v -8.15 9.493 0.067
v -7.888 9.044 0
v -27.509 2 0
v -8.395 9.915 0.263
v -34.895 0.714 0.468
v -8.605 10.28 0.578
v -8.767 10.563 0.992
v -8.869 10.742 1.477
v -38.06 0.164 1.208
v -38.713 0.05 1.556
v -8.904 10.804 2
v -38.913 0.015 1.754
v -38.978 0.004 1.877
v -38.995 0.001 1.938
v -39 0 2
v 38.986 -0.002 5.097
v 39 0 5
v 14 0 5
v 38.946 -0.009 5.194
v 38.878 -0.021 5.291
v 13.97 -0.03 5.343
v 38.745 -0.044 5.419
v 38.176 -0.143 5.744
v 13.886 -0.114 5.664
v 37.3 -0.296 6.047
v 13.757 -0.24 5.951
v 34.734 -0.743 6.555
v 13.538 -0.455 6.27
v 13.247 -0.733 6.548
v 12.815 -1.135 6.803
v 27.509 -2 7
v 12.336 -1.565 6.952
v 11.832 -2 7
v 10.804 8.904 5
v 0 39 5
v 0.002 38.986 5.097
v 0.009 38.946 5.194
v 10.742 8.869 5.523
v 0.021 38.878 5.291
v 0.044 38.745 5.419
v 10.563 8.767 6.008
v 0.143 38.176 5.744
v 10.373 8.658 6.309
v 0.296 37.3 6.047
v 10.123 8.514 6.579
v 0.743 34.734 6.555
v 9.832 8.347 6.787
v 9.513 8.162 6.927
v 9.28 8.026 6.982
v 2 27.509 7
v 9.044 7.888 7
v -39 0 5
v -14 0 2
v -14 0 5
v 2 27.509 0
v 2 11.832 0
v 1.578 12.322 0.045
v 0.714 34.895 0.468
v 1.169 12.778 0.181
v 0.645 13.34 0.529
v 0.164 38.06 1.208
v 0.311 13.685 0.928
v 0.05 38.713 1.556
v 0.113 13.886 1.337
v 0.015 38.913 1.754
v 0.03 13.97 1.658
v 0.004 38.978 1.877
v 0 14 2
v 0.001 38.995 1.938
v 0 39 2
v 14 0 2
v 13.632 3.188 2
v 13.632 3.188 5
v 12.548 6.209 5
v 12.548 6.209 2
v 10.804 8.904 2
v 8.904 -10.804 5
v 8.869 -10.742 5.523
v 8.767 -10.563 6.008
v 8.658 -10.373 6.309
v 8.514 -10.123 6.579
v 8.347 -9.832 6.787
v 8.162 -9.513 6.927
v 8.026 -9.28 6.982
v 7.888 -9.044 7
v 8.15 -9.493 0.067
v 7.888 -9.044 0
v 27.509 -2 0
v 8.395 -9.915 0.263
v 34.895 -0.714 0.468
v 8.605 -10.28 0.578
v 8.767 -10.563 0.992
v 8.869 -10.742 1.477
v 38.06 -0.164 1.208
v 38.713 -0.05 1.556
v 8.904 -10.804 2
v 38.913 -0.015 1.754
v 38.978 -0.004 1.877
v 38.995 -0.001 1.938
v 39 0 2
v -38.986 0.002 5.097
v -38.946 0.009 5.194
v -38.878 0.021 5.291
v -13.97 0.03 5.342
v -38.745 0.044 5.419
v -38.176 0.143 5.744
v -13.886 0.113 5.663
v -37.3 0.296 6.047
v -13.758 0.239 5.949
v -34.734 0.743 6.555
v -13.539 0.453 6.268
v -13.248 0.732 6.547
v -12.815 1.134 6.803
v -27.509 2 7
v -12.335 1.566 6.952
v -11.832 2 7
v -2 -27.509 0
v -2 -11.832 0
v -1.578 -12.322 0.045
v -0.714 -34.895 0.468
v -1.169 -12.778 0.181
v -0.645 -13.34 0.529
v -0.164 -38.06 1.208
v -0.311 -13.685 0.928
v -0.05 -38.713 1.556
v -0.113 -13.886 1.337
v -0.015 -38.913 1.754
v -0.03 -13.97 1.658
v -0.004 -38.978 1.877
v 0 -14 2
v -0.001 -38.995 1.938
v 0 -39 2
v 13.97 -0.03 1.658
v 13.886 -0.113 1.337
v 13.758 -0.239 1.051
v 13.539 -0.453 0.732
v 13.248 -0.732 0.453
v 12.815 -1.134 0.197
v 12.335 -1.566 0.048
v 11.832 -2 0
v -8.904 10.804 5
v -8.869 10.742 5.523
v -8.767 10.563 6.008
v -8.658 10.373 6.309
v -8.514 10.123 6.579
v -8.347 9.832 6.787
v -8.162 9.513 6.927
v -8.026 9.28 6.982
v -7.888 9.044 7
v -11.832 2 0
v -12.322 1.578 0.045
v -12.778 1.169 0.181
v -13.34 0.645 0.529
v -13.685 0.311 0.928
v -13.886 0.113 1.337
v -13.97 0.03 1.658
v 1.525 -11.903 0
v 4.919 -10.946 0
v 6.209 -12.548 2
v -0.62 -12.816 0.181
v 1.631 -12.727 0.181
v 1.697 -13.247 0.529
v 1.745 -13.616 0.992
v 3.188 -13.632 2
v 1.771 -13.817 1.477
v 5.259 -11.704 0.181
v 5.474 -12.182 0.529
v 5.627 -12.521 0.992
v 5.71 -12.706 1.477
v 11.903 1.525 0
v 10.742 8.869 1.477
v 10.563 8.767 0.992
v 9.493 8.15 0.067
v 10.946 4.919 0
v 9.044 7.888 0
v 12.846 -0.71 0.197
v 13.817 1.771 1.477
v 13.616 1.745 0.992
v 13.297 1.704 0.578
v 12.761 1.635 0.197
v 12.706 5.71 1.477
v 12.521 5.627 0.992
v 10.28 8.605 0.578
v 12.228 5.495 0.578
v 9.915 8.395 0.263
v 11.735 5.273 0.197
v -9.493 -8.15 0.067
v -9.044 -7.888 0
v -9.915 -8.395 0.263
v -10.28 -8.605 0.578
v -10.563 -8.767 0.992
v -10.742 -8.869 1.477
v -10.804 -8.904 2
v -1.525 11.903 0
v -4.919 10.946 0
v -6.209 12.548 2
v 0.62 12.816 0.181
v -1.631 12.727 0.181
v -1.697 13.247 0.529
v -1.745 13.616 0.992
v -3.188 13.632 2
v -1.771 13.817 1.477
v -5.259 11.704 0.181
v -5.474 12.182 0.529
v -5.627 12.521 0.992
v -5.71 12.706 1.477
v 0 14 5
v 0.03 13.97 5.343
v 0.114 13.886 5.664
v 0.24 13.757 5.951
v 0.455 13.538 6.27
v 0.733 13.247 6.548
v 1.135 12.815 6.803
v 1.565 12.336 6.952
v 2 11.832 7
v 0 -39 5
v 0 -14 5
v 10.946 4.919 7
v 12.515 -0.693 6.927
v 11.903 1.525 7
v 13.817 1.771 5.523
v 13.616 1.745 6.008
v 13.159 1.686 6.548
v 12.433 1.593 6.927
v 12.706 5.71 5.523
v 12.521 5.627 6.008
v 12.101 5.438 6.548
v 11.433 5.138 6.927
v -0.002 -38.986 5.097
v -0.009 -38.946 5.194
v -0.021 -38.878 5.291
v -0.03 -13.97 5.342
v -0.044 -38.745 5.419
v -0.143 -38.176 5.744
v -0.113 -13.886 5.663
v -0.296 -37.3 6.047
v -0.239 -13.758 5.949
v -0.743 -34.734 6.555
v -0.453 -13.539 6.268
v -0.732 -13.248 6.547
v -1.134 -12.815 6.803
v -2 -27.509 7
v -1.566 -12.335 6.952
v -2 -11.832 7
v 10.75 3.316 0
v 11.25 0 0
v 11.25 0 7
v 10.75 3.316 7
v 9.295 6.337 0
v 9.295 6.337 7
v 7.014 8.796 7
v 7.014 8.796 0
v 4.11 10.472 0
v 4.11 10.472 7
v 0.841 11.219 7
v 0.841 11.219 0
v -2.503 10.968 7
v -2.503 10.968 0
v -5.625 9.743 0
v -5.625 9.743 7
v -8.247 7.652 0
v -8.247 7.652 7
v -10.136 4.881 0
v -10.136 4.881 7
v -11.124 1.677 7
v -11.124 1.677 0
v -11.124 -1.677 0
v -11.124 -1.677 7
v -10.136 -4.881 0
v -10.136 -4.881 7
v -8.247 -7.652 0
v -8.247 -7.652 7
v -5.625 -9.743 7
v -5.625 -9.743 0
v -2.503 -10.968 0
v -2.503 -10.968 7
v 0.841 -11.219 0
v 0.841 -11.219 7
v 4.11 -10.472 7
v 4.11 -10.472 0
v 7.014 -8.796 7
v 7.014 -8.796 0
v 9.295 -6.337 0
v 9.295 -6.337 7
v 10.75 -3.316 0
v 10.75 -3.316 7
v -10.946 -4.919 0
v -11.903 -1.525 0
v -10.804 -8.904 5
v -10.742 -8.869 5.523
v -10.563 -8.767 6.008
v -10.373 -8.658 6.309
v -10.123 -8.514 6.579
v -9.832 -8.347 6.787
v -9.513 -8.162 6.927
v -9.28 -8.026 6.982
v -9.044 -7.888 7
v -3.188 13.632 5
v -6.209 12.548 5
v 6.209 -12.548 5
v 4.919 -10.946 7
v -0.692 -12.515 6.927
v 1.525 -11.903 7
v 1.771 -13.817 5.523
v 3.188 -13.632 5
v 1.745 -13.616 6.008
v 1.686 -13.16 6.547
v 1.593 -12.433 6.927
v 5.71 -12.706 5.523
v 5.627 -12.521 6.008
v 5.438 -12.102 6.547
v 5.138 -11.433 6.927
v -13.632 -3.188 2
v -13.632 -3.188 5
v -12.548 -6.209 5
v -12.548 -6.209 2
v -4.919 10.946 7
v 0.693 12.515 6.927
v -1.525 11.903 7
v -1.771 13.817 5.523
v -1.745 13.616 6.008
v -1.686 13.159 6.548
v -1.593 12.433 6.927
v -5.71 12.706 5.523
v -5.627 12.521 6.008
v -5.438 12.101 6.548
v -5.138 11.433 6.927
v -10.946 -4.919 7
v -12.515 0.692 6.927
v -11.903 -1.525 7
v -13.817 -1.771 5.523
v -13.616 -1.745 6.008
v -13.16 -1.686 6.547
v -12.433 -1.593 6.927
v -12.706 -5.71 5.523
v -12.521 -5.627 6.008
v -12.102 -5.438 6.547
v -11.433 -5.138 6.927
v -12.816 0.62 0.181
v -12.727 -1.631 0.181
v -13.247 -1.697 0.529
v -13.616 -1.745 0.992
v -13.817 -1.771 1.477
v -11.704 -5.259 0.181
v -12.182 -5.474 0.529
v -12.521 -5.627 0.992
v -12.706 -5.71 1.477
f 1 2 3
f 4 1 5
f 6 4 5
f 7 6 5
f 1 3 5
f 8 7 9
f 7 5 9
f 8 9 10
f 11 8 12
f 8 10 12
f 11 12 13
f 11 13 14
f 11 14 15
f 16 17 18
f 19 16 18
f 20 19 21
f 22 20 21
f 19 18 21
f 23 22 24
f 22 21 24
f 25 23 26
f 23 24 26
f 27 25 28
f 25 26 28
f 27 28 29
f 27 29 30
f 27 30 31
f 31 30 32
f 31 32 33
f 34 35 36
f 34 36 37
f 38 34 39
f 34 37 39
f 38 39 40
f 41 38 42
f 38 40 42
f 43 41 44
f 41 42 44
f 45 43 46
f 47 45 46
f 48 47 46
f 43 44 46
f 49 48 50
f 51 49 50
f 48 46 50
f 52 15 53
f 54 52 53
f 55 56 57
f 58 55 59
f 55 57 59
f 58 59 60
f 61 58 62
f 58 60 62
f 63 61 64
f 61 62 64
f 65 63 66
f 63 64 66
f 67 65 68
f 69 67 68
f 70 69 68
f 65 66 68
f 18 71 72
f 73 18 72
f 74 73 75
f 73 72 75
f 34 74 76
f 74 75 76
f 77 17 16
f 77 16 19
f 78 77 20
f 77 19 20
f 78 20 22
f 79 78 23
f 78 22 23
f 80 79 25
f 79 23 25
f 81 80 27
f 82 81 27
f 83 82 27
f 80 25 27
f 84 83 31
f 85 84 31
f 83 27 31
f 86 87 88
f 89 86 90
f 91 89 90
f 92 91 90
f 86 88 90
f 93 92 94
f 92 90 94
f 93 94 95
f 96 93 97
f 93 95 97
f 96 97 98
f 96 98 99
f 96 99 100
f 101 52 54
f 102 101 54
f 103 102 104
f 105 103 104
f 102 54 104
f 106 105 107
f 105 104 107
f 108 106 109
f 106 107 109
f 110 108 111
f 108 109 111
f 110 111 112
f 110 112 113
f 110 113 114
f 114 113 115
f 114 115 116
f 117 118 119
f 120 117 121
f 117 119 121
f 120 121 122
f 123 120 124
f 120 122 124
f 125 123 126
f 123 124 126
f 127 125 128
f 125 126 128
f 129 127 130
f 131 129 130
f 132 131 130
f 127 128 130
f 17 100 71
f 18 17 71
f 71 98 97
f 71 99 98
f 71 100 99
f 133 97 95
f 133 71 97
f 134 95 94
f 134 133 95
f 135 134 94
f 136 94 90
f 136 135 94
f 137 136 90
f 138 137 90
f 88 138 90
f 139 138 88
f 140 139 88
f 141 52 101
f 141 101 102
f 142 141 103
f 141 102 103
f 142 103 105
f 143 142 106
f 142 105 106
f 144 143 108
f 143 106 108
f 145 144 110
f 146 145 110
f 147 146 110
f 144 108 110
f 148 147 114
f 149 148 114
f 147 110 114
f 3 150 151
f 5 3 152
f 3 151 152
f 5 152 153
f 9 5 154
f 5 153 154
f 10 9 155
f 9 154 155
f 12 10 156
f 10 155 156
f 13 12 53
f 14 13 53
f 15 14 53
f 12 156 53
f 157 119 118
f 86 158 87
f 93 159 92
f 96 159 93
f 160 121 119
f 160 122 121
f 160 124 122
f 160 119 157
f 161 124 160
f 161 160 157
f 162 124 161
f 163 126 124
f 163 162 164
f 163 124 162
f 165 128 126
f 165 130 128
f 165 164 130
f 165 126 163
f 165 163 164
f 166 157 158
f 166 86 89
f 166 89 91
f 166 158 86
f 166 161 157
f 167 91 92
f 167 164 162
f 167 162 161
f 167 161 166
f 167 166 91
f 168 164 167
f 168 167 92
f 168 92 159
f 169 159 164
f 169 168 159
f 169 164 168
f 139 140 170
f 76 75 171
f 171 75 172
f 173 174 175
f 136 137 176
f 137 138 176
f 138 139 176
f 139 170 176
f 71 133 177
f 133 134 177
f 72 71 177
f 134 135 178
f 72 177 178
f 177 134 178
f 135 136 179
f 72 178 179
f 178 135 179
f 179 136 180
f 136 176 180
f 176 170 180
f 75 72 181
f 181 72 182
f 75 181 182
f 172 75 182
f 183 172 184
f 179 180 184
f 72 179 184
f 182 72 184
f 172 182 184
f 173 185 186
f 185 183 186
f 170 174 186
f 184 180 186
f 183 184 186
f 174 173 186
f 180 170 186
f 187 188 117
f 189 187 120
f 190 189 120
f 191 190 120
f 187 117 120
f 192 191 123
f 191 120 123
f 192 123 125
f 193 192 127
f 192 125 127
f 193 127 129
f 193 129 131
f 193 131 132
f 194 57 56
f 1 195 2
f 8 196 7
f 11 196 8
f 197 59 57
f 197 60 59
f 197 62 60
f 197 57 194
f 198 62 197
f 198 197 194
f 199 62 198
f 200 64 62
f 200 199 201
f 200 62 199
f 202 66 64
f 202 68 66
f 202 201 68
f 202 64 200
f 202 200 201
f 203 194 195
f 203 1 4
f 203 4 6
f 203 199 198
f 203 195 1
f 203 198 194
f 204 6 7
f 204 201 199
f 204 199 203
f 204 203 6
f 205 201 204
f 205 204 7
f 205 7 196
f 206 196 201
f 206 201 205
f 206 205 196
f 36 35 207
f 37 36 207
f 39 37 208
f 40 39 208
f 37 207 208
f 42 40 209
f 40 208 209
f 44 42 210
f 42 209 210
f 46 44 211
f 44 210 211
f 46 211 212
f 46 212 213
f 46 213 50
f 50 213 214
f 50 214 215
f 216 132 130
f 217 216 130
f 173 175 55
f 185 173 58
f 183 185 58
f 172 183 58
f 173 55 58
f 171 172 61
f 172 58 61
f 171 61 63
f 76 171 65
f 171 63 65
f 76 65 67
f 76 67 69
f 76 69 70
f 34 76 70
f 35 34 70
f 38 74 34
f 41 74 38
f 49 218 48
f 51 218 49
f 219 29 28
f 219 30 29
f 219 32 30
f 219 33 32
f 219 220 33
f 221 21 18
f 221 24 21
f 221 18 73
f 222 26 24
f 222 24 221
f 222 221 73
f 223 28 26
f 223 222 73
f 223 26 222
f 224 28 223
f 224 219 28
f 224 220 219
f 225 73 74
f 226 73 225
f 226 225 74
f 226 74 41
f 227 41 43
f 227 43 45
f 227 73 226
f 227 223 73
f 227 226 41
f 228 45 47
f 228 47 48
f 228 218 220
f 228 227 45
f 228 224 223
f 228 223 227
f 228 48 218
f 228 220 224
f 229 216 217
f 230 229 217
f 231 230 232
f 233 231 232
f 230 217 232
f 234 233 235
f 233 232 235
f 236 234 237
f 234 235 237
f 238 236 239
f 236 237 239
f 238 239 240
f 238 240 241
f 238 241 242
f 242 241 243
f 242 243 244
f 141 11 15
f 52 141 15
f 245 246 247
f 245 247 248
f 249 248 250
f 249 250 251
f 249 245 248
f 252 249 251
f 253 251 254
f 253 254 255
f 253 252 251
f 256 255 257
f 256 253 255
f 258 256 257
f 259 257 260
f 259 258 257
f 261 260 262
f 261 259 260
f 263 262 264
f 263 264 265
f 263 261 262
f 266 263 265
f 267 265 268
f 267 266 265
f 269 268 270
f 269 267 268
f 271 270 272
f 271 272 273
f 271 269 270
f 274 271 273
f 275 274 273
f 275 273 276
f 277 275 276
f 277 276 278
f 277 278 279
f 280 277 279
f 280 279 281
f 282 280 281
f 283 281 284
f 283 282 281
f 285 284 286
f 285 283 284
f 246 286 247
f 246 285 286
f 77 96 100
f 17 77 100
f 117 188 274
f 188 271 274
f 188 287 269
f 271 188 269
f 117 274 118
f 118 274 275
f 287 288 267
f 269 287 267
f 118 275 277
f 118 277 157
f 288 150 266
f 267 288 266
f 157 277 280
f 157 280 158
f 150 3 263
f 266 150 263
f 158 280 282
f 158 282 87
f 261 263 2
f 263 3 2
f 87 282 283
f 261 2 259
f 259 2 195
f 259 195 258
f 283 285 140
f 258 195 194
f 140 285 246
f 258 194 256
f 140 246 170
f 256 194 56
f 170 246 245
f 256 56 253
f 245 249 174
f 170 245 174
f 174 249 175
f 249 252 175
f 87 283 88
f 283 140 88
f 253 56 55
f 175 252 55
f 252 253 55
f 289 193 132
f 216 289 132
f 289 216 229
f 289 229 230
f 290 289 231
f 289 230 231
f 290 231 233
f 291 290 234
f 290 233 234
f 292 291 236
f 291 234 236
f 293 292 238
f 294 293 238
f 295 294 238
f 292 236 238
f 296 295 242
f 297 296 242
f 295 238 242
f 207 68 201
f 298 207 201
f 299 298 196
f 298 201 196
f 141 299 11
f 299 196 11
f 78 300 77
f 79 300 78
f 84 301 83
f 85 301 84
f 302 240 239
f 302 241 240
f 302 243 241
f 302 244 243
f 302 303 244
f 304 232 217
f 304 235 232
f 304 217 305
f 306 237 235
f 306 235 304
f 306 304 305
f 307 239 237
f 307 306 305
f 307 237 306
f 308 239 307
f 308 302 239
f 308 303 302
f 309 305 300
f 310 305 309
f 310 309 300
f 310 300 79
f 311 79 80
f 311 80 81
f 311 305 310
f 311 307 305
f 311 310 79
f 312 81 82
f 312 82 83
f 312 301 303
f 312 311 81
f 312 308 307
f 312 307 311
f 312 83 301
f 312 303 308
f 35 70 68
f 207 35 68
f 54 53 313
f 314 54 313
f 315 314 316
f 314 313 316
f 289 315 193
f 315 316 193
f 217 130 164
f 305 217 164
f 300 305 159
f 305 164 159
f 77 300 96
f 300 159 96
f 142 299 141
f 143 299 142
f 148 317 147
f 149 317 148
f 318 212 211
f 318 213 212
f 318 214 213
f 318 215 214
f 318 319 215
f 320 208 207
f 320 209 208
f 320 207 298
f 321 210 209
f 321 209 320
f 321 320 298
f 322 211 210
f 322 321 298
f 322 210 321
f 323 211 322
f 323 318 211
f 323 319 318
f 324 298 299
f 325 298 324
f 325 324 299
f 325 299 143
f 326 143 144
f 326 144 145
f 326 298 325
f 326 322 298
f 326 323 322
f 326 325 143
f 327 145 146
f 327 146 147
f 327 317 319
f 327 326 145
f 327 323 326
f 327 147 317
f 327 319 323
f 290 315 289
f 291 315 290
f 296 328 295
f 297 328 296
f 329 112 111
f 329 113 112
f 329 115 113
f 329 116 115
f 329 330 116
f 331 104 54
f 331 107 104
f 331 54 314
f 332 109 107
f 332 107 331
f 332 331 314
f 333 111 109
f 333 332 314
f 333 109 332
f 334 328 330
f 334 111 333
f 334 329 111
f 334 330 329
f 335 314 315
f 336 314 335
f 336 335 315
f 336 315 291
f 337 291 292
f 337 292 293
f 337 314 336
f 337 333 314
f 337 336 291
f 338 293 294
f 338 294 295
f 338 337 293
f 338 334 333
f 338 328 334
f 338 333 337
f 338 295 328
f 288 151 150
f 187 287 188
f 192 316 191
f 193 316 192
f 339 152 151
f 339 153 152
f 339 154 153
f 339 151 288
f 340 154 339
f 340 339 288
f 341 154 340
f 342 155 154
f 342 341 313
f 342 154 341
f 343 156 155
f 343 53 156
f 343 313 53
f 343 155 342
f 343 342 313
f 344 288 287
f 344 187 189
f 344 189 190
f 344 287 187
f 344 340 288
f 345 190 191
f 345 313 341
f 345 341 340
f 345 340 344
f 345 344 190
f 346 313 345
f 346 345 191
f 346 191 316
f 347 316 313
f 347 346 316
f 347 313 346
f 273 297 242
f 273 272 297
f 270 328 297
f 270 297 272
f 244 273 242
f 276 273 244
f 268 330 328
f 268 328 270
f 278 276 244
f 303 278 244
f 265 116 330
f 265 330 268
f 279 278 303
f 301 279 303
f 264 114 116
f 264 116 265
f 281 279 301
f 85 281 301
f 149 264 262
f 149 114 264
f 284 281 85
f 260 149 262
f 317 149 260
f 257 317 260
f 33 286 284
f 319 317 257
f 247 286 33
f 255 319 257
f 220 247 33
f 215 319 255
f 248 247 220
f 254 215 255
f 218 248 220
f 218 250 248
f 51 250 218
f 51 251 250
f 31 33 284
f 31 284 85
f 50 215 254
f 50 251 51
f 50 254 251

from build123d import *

# Parameters (mm, degrees)
F0_R     = 11.25
F1_DEPTH = 7
F2_R     = 2
F3_R     = 2


with BuildPart() as f1:
    # F0 (on Top) → F1 (new body)
    with BuildSketch(Plane.XY):
        with BuildLine():
            Line((10.8037274316, 8.9039021549), (14, 0))
            ThreePointArc((14, 0), (13.1767253907, 4.7301065505), (10.8037274316, 8.9039021549))
        make_face()
        with BuildLine():
            Line((39, 0), (14, 0))
            ThreePointArc((14, 0), (12.6620422952, -5.97266146), (8.9039021549, -10.8037274316))
            Line((8.9039021549, -10.8037274316), (39, 0))
        make_face()
        with BuildLine():
            ThreePointArc((8.9039021549, -10.8037274316), (12.6620422952, -5.97266146), (14, 0))
            Line((14, 0), (10.8037274316, 8.9039021549))
            ThreePointArc((10.8037274316, 8.9039021549), (5.97266146, 12.6620422952), (0, 14))
            Line((0, 14), (-8.9039021549, 10.8037274316))
            ThreePointArc((-8.9039021549, 10.8037274316), (-12.6620422952, 5.97266146), (-14, 0))
            Line((-14, 0), (-10.8037274316, -8.9039021549))
            ThreePointArc((-10.8037274316, -8.9039021549), (-5.97266146, -12.6620422952), (0, -14))
            Line((0, -14), (8.9039021549, -10.8037274316))
        make_face()
        Circle(F0_R, mode=Mode.SUBTRACT)
        with BuildLine():
            ThreePointArc((0, 14), (5.97266146, 12.6620422952), (10.8037274316, 8.9039021549))
            Line((10.8037274316, 8.9039021549), (0, 39))
            Line((0, 39), (0, 14))
        make_face()
        with BuildLine():
            ThreePointArc((0, -14), (4.7301065505, -13.1767253907), (8.9039021549, -10.8037274316))
            Line((8.9039021549, -10.8037274316), (0, -14))
        make_face()
        with BuildLine():
            Line((-8.9039021549, 10.8037274316), (0, 14))
            ThreePointArc((0, 14), (-4.7301065505, 13.1767253907), (-8.9039021549, 10.8037274316))
        make_face()
        with BuildLine():
            Line((0, -39), (0, -14))
            ThreePointArc((0, -14), (-5.97266146, -12.6620422952), (-10.8037274316, -8.9039021549))
            Line((-10.8037274316, -8.9039021549), (0, -39))
        make_face()
        with BuildLine():
            ThreePointArc((-14, 0), (-12.6620422952, 5.97266146), (-8.9039021549, 10.8037274316))
            Line((-8.9039021549, 10.8037274316), (-39, 0))
            Line((-39, 0), (-14, 0))
        make_face()
        with BuildLine():
            ThreePointArc((-14, 0), (-13.1767253907, -4.7301065505), (-10.8037274316, -8.9039021549))
            Line((-10.8037274316, -8.9039021549), (-14, 0))
        make_face()
    extrude(amount=F1_DEPTH)

    # F2
    f2_edges = [f1.edges().sort_by_distance(p)[0] for p in [
        (0, -26.5, 7),
        (23.951951, -5.401864, 7),
        (5.401864, 23.951951, 7),
        (-23.951951, 5.401864, 7),
        (-26.5, 0, 7),
        (-5.401864, -23.951951, 7),
        (0, 26.5, 7),
        (13.176725, 4.730107, 7),
        (-4.730107, 13.176725, 7),
        (-13.176725, -4.730107, 7),
        (4.730107, -13.176725, 7),
        (26.5, 0, 7),
    ]]
    fillet(f2_edges, radius=F2_R)

    # F3
    f3_edges = [f1.edges().sort_by_distance(p)[0] for p in [
        (-26.5, 0, 0),
        (-5.401864, -23.951951, 0),
        (0, -26.5, 0),
        (23.951951, -5.401864, 0),
        (26.5, 0, 0),
        (5.401864, 23.951951, 0),
        (0, 26.5, 0),
        (-23.951951, 5.401864, 0),
        (4.730107, -13.176725, 0),
        (-13.176725, -4.730107, 0),
        (-4.730107, 13.176725, 0),
        (13.176725, 4.730107, 0),
    ]]
    fillet(f3_edges, radius=F3_R)


solid = f1.part
